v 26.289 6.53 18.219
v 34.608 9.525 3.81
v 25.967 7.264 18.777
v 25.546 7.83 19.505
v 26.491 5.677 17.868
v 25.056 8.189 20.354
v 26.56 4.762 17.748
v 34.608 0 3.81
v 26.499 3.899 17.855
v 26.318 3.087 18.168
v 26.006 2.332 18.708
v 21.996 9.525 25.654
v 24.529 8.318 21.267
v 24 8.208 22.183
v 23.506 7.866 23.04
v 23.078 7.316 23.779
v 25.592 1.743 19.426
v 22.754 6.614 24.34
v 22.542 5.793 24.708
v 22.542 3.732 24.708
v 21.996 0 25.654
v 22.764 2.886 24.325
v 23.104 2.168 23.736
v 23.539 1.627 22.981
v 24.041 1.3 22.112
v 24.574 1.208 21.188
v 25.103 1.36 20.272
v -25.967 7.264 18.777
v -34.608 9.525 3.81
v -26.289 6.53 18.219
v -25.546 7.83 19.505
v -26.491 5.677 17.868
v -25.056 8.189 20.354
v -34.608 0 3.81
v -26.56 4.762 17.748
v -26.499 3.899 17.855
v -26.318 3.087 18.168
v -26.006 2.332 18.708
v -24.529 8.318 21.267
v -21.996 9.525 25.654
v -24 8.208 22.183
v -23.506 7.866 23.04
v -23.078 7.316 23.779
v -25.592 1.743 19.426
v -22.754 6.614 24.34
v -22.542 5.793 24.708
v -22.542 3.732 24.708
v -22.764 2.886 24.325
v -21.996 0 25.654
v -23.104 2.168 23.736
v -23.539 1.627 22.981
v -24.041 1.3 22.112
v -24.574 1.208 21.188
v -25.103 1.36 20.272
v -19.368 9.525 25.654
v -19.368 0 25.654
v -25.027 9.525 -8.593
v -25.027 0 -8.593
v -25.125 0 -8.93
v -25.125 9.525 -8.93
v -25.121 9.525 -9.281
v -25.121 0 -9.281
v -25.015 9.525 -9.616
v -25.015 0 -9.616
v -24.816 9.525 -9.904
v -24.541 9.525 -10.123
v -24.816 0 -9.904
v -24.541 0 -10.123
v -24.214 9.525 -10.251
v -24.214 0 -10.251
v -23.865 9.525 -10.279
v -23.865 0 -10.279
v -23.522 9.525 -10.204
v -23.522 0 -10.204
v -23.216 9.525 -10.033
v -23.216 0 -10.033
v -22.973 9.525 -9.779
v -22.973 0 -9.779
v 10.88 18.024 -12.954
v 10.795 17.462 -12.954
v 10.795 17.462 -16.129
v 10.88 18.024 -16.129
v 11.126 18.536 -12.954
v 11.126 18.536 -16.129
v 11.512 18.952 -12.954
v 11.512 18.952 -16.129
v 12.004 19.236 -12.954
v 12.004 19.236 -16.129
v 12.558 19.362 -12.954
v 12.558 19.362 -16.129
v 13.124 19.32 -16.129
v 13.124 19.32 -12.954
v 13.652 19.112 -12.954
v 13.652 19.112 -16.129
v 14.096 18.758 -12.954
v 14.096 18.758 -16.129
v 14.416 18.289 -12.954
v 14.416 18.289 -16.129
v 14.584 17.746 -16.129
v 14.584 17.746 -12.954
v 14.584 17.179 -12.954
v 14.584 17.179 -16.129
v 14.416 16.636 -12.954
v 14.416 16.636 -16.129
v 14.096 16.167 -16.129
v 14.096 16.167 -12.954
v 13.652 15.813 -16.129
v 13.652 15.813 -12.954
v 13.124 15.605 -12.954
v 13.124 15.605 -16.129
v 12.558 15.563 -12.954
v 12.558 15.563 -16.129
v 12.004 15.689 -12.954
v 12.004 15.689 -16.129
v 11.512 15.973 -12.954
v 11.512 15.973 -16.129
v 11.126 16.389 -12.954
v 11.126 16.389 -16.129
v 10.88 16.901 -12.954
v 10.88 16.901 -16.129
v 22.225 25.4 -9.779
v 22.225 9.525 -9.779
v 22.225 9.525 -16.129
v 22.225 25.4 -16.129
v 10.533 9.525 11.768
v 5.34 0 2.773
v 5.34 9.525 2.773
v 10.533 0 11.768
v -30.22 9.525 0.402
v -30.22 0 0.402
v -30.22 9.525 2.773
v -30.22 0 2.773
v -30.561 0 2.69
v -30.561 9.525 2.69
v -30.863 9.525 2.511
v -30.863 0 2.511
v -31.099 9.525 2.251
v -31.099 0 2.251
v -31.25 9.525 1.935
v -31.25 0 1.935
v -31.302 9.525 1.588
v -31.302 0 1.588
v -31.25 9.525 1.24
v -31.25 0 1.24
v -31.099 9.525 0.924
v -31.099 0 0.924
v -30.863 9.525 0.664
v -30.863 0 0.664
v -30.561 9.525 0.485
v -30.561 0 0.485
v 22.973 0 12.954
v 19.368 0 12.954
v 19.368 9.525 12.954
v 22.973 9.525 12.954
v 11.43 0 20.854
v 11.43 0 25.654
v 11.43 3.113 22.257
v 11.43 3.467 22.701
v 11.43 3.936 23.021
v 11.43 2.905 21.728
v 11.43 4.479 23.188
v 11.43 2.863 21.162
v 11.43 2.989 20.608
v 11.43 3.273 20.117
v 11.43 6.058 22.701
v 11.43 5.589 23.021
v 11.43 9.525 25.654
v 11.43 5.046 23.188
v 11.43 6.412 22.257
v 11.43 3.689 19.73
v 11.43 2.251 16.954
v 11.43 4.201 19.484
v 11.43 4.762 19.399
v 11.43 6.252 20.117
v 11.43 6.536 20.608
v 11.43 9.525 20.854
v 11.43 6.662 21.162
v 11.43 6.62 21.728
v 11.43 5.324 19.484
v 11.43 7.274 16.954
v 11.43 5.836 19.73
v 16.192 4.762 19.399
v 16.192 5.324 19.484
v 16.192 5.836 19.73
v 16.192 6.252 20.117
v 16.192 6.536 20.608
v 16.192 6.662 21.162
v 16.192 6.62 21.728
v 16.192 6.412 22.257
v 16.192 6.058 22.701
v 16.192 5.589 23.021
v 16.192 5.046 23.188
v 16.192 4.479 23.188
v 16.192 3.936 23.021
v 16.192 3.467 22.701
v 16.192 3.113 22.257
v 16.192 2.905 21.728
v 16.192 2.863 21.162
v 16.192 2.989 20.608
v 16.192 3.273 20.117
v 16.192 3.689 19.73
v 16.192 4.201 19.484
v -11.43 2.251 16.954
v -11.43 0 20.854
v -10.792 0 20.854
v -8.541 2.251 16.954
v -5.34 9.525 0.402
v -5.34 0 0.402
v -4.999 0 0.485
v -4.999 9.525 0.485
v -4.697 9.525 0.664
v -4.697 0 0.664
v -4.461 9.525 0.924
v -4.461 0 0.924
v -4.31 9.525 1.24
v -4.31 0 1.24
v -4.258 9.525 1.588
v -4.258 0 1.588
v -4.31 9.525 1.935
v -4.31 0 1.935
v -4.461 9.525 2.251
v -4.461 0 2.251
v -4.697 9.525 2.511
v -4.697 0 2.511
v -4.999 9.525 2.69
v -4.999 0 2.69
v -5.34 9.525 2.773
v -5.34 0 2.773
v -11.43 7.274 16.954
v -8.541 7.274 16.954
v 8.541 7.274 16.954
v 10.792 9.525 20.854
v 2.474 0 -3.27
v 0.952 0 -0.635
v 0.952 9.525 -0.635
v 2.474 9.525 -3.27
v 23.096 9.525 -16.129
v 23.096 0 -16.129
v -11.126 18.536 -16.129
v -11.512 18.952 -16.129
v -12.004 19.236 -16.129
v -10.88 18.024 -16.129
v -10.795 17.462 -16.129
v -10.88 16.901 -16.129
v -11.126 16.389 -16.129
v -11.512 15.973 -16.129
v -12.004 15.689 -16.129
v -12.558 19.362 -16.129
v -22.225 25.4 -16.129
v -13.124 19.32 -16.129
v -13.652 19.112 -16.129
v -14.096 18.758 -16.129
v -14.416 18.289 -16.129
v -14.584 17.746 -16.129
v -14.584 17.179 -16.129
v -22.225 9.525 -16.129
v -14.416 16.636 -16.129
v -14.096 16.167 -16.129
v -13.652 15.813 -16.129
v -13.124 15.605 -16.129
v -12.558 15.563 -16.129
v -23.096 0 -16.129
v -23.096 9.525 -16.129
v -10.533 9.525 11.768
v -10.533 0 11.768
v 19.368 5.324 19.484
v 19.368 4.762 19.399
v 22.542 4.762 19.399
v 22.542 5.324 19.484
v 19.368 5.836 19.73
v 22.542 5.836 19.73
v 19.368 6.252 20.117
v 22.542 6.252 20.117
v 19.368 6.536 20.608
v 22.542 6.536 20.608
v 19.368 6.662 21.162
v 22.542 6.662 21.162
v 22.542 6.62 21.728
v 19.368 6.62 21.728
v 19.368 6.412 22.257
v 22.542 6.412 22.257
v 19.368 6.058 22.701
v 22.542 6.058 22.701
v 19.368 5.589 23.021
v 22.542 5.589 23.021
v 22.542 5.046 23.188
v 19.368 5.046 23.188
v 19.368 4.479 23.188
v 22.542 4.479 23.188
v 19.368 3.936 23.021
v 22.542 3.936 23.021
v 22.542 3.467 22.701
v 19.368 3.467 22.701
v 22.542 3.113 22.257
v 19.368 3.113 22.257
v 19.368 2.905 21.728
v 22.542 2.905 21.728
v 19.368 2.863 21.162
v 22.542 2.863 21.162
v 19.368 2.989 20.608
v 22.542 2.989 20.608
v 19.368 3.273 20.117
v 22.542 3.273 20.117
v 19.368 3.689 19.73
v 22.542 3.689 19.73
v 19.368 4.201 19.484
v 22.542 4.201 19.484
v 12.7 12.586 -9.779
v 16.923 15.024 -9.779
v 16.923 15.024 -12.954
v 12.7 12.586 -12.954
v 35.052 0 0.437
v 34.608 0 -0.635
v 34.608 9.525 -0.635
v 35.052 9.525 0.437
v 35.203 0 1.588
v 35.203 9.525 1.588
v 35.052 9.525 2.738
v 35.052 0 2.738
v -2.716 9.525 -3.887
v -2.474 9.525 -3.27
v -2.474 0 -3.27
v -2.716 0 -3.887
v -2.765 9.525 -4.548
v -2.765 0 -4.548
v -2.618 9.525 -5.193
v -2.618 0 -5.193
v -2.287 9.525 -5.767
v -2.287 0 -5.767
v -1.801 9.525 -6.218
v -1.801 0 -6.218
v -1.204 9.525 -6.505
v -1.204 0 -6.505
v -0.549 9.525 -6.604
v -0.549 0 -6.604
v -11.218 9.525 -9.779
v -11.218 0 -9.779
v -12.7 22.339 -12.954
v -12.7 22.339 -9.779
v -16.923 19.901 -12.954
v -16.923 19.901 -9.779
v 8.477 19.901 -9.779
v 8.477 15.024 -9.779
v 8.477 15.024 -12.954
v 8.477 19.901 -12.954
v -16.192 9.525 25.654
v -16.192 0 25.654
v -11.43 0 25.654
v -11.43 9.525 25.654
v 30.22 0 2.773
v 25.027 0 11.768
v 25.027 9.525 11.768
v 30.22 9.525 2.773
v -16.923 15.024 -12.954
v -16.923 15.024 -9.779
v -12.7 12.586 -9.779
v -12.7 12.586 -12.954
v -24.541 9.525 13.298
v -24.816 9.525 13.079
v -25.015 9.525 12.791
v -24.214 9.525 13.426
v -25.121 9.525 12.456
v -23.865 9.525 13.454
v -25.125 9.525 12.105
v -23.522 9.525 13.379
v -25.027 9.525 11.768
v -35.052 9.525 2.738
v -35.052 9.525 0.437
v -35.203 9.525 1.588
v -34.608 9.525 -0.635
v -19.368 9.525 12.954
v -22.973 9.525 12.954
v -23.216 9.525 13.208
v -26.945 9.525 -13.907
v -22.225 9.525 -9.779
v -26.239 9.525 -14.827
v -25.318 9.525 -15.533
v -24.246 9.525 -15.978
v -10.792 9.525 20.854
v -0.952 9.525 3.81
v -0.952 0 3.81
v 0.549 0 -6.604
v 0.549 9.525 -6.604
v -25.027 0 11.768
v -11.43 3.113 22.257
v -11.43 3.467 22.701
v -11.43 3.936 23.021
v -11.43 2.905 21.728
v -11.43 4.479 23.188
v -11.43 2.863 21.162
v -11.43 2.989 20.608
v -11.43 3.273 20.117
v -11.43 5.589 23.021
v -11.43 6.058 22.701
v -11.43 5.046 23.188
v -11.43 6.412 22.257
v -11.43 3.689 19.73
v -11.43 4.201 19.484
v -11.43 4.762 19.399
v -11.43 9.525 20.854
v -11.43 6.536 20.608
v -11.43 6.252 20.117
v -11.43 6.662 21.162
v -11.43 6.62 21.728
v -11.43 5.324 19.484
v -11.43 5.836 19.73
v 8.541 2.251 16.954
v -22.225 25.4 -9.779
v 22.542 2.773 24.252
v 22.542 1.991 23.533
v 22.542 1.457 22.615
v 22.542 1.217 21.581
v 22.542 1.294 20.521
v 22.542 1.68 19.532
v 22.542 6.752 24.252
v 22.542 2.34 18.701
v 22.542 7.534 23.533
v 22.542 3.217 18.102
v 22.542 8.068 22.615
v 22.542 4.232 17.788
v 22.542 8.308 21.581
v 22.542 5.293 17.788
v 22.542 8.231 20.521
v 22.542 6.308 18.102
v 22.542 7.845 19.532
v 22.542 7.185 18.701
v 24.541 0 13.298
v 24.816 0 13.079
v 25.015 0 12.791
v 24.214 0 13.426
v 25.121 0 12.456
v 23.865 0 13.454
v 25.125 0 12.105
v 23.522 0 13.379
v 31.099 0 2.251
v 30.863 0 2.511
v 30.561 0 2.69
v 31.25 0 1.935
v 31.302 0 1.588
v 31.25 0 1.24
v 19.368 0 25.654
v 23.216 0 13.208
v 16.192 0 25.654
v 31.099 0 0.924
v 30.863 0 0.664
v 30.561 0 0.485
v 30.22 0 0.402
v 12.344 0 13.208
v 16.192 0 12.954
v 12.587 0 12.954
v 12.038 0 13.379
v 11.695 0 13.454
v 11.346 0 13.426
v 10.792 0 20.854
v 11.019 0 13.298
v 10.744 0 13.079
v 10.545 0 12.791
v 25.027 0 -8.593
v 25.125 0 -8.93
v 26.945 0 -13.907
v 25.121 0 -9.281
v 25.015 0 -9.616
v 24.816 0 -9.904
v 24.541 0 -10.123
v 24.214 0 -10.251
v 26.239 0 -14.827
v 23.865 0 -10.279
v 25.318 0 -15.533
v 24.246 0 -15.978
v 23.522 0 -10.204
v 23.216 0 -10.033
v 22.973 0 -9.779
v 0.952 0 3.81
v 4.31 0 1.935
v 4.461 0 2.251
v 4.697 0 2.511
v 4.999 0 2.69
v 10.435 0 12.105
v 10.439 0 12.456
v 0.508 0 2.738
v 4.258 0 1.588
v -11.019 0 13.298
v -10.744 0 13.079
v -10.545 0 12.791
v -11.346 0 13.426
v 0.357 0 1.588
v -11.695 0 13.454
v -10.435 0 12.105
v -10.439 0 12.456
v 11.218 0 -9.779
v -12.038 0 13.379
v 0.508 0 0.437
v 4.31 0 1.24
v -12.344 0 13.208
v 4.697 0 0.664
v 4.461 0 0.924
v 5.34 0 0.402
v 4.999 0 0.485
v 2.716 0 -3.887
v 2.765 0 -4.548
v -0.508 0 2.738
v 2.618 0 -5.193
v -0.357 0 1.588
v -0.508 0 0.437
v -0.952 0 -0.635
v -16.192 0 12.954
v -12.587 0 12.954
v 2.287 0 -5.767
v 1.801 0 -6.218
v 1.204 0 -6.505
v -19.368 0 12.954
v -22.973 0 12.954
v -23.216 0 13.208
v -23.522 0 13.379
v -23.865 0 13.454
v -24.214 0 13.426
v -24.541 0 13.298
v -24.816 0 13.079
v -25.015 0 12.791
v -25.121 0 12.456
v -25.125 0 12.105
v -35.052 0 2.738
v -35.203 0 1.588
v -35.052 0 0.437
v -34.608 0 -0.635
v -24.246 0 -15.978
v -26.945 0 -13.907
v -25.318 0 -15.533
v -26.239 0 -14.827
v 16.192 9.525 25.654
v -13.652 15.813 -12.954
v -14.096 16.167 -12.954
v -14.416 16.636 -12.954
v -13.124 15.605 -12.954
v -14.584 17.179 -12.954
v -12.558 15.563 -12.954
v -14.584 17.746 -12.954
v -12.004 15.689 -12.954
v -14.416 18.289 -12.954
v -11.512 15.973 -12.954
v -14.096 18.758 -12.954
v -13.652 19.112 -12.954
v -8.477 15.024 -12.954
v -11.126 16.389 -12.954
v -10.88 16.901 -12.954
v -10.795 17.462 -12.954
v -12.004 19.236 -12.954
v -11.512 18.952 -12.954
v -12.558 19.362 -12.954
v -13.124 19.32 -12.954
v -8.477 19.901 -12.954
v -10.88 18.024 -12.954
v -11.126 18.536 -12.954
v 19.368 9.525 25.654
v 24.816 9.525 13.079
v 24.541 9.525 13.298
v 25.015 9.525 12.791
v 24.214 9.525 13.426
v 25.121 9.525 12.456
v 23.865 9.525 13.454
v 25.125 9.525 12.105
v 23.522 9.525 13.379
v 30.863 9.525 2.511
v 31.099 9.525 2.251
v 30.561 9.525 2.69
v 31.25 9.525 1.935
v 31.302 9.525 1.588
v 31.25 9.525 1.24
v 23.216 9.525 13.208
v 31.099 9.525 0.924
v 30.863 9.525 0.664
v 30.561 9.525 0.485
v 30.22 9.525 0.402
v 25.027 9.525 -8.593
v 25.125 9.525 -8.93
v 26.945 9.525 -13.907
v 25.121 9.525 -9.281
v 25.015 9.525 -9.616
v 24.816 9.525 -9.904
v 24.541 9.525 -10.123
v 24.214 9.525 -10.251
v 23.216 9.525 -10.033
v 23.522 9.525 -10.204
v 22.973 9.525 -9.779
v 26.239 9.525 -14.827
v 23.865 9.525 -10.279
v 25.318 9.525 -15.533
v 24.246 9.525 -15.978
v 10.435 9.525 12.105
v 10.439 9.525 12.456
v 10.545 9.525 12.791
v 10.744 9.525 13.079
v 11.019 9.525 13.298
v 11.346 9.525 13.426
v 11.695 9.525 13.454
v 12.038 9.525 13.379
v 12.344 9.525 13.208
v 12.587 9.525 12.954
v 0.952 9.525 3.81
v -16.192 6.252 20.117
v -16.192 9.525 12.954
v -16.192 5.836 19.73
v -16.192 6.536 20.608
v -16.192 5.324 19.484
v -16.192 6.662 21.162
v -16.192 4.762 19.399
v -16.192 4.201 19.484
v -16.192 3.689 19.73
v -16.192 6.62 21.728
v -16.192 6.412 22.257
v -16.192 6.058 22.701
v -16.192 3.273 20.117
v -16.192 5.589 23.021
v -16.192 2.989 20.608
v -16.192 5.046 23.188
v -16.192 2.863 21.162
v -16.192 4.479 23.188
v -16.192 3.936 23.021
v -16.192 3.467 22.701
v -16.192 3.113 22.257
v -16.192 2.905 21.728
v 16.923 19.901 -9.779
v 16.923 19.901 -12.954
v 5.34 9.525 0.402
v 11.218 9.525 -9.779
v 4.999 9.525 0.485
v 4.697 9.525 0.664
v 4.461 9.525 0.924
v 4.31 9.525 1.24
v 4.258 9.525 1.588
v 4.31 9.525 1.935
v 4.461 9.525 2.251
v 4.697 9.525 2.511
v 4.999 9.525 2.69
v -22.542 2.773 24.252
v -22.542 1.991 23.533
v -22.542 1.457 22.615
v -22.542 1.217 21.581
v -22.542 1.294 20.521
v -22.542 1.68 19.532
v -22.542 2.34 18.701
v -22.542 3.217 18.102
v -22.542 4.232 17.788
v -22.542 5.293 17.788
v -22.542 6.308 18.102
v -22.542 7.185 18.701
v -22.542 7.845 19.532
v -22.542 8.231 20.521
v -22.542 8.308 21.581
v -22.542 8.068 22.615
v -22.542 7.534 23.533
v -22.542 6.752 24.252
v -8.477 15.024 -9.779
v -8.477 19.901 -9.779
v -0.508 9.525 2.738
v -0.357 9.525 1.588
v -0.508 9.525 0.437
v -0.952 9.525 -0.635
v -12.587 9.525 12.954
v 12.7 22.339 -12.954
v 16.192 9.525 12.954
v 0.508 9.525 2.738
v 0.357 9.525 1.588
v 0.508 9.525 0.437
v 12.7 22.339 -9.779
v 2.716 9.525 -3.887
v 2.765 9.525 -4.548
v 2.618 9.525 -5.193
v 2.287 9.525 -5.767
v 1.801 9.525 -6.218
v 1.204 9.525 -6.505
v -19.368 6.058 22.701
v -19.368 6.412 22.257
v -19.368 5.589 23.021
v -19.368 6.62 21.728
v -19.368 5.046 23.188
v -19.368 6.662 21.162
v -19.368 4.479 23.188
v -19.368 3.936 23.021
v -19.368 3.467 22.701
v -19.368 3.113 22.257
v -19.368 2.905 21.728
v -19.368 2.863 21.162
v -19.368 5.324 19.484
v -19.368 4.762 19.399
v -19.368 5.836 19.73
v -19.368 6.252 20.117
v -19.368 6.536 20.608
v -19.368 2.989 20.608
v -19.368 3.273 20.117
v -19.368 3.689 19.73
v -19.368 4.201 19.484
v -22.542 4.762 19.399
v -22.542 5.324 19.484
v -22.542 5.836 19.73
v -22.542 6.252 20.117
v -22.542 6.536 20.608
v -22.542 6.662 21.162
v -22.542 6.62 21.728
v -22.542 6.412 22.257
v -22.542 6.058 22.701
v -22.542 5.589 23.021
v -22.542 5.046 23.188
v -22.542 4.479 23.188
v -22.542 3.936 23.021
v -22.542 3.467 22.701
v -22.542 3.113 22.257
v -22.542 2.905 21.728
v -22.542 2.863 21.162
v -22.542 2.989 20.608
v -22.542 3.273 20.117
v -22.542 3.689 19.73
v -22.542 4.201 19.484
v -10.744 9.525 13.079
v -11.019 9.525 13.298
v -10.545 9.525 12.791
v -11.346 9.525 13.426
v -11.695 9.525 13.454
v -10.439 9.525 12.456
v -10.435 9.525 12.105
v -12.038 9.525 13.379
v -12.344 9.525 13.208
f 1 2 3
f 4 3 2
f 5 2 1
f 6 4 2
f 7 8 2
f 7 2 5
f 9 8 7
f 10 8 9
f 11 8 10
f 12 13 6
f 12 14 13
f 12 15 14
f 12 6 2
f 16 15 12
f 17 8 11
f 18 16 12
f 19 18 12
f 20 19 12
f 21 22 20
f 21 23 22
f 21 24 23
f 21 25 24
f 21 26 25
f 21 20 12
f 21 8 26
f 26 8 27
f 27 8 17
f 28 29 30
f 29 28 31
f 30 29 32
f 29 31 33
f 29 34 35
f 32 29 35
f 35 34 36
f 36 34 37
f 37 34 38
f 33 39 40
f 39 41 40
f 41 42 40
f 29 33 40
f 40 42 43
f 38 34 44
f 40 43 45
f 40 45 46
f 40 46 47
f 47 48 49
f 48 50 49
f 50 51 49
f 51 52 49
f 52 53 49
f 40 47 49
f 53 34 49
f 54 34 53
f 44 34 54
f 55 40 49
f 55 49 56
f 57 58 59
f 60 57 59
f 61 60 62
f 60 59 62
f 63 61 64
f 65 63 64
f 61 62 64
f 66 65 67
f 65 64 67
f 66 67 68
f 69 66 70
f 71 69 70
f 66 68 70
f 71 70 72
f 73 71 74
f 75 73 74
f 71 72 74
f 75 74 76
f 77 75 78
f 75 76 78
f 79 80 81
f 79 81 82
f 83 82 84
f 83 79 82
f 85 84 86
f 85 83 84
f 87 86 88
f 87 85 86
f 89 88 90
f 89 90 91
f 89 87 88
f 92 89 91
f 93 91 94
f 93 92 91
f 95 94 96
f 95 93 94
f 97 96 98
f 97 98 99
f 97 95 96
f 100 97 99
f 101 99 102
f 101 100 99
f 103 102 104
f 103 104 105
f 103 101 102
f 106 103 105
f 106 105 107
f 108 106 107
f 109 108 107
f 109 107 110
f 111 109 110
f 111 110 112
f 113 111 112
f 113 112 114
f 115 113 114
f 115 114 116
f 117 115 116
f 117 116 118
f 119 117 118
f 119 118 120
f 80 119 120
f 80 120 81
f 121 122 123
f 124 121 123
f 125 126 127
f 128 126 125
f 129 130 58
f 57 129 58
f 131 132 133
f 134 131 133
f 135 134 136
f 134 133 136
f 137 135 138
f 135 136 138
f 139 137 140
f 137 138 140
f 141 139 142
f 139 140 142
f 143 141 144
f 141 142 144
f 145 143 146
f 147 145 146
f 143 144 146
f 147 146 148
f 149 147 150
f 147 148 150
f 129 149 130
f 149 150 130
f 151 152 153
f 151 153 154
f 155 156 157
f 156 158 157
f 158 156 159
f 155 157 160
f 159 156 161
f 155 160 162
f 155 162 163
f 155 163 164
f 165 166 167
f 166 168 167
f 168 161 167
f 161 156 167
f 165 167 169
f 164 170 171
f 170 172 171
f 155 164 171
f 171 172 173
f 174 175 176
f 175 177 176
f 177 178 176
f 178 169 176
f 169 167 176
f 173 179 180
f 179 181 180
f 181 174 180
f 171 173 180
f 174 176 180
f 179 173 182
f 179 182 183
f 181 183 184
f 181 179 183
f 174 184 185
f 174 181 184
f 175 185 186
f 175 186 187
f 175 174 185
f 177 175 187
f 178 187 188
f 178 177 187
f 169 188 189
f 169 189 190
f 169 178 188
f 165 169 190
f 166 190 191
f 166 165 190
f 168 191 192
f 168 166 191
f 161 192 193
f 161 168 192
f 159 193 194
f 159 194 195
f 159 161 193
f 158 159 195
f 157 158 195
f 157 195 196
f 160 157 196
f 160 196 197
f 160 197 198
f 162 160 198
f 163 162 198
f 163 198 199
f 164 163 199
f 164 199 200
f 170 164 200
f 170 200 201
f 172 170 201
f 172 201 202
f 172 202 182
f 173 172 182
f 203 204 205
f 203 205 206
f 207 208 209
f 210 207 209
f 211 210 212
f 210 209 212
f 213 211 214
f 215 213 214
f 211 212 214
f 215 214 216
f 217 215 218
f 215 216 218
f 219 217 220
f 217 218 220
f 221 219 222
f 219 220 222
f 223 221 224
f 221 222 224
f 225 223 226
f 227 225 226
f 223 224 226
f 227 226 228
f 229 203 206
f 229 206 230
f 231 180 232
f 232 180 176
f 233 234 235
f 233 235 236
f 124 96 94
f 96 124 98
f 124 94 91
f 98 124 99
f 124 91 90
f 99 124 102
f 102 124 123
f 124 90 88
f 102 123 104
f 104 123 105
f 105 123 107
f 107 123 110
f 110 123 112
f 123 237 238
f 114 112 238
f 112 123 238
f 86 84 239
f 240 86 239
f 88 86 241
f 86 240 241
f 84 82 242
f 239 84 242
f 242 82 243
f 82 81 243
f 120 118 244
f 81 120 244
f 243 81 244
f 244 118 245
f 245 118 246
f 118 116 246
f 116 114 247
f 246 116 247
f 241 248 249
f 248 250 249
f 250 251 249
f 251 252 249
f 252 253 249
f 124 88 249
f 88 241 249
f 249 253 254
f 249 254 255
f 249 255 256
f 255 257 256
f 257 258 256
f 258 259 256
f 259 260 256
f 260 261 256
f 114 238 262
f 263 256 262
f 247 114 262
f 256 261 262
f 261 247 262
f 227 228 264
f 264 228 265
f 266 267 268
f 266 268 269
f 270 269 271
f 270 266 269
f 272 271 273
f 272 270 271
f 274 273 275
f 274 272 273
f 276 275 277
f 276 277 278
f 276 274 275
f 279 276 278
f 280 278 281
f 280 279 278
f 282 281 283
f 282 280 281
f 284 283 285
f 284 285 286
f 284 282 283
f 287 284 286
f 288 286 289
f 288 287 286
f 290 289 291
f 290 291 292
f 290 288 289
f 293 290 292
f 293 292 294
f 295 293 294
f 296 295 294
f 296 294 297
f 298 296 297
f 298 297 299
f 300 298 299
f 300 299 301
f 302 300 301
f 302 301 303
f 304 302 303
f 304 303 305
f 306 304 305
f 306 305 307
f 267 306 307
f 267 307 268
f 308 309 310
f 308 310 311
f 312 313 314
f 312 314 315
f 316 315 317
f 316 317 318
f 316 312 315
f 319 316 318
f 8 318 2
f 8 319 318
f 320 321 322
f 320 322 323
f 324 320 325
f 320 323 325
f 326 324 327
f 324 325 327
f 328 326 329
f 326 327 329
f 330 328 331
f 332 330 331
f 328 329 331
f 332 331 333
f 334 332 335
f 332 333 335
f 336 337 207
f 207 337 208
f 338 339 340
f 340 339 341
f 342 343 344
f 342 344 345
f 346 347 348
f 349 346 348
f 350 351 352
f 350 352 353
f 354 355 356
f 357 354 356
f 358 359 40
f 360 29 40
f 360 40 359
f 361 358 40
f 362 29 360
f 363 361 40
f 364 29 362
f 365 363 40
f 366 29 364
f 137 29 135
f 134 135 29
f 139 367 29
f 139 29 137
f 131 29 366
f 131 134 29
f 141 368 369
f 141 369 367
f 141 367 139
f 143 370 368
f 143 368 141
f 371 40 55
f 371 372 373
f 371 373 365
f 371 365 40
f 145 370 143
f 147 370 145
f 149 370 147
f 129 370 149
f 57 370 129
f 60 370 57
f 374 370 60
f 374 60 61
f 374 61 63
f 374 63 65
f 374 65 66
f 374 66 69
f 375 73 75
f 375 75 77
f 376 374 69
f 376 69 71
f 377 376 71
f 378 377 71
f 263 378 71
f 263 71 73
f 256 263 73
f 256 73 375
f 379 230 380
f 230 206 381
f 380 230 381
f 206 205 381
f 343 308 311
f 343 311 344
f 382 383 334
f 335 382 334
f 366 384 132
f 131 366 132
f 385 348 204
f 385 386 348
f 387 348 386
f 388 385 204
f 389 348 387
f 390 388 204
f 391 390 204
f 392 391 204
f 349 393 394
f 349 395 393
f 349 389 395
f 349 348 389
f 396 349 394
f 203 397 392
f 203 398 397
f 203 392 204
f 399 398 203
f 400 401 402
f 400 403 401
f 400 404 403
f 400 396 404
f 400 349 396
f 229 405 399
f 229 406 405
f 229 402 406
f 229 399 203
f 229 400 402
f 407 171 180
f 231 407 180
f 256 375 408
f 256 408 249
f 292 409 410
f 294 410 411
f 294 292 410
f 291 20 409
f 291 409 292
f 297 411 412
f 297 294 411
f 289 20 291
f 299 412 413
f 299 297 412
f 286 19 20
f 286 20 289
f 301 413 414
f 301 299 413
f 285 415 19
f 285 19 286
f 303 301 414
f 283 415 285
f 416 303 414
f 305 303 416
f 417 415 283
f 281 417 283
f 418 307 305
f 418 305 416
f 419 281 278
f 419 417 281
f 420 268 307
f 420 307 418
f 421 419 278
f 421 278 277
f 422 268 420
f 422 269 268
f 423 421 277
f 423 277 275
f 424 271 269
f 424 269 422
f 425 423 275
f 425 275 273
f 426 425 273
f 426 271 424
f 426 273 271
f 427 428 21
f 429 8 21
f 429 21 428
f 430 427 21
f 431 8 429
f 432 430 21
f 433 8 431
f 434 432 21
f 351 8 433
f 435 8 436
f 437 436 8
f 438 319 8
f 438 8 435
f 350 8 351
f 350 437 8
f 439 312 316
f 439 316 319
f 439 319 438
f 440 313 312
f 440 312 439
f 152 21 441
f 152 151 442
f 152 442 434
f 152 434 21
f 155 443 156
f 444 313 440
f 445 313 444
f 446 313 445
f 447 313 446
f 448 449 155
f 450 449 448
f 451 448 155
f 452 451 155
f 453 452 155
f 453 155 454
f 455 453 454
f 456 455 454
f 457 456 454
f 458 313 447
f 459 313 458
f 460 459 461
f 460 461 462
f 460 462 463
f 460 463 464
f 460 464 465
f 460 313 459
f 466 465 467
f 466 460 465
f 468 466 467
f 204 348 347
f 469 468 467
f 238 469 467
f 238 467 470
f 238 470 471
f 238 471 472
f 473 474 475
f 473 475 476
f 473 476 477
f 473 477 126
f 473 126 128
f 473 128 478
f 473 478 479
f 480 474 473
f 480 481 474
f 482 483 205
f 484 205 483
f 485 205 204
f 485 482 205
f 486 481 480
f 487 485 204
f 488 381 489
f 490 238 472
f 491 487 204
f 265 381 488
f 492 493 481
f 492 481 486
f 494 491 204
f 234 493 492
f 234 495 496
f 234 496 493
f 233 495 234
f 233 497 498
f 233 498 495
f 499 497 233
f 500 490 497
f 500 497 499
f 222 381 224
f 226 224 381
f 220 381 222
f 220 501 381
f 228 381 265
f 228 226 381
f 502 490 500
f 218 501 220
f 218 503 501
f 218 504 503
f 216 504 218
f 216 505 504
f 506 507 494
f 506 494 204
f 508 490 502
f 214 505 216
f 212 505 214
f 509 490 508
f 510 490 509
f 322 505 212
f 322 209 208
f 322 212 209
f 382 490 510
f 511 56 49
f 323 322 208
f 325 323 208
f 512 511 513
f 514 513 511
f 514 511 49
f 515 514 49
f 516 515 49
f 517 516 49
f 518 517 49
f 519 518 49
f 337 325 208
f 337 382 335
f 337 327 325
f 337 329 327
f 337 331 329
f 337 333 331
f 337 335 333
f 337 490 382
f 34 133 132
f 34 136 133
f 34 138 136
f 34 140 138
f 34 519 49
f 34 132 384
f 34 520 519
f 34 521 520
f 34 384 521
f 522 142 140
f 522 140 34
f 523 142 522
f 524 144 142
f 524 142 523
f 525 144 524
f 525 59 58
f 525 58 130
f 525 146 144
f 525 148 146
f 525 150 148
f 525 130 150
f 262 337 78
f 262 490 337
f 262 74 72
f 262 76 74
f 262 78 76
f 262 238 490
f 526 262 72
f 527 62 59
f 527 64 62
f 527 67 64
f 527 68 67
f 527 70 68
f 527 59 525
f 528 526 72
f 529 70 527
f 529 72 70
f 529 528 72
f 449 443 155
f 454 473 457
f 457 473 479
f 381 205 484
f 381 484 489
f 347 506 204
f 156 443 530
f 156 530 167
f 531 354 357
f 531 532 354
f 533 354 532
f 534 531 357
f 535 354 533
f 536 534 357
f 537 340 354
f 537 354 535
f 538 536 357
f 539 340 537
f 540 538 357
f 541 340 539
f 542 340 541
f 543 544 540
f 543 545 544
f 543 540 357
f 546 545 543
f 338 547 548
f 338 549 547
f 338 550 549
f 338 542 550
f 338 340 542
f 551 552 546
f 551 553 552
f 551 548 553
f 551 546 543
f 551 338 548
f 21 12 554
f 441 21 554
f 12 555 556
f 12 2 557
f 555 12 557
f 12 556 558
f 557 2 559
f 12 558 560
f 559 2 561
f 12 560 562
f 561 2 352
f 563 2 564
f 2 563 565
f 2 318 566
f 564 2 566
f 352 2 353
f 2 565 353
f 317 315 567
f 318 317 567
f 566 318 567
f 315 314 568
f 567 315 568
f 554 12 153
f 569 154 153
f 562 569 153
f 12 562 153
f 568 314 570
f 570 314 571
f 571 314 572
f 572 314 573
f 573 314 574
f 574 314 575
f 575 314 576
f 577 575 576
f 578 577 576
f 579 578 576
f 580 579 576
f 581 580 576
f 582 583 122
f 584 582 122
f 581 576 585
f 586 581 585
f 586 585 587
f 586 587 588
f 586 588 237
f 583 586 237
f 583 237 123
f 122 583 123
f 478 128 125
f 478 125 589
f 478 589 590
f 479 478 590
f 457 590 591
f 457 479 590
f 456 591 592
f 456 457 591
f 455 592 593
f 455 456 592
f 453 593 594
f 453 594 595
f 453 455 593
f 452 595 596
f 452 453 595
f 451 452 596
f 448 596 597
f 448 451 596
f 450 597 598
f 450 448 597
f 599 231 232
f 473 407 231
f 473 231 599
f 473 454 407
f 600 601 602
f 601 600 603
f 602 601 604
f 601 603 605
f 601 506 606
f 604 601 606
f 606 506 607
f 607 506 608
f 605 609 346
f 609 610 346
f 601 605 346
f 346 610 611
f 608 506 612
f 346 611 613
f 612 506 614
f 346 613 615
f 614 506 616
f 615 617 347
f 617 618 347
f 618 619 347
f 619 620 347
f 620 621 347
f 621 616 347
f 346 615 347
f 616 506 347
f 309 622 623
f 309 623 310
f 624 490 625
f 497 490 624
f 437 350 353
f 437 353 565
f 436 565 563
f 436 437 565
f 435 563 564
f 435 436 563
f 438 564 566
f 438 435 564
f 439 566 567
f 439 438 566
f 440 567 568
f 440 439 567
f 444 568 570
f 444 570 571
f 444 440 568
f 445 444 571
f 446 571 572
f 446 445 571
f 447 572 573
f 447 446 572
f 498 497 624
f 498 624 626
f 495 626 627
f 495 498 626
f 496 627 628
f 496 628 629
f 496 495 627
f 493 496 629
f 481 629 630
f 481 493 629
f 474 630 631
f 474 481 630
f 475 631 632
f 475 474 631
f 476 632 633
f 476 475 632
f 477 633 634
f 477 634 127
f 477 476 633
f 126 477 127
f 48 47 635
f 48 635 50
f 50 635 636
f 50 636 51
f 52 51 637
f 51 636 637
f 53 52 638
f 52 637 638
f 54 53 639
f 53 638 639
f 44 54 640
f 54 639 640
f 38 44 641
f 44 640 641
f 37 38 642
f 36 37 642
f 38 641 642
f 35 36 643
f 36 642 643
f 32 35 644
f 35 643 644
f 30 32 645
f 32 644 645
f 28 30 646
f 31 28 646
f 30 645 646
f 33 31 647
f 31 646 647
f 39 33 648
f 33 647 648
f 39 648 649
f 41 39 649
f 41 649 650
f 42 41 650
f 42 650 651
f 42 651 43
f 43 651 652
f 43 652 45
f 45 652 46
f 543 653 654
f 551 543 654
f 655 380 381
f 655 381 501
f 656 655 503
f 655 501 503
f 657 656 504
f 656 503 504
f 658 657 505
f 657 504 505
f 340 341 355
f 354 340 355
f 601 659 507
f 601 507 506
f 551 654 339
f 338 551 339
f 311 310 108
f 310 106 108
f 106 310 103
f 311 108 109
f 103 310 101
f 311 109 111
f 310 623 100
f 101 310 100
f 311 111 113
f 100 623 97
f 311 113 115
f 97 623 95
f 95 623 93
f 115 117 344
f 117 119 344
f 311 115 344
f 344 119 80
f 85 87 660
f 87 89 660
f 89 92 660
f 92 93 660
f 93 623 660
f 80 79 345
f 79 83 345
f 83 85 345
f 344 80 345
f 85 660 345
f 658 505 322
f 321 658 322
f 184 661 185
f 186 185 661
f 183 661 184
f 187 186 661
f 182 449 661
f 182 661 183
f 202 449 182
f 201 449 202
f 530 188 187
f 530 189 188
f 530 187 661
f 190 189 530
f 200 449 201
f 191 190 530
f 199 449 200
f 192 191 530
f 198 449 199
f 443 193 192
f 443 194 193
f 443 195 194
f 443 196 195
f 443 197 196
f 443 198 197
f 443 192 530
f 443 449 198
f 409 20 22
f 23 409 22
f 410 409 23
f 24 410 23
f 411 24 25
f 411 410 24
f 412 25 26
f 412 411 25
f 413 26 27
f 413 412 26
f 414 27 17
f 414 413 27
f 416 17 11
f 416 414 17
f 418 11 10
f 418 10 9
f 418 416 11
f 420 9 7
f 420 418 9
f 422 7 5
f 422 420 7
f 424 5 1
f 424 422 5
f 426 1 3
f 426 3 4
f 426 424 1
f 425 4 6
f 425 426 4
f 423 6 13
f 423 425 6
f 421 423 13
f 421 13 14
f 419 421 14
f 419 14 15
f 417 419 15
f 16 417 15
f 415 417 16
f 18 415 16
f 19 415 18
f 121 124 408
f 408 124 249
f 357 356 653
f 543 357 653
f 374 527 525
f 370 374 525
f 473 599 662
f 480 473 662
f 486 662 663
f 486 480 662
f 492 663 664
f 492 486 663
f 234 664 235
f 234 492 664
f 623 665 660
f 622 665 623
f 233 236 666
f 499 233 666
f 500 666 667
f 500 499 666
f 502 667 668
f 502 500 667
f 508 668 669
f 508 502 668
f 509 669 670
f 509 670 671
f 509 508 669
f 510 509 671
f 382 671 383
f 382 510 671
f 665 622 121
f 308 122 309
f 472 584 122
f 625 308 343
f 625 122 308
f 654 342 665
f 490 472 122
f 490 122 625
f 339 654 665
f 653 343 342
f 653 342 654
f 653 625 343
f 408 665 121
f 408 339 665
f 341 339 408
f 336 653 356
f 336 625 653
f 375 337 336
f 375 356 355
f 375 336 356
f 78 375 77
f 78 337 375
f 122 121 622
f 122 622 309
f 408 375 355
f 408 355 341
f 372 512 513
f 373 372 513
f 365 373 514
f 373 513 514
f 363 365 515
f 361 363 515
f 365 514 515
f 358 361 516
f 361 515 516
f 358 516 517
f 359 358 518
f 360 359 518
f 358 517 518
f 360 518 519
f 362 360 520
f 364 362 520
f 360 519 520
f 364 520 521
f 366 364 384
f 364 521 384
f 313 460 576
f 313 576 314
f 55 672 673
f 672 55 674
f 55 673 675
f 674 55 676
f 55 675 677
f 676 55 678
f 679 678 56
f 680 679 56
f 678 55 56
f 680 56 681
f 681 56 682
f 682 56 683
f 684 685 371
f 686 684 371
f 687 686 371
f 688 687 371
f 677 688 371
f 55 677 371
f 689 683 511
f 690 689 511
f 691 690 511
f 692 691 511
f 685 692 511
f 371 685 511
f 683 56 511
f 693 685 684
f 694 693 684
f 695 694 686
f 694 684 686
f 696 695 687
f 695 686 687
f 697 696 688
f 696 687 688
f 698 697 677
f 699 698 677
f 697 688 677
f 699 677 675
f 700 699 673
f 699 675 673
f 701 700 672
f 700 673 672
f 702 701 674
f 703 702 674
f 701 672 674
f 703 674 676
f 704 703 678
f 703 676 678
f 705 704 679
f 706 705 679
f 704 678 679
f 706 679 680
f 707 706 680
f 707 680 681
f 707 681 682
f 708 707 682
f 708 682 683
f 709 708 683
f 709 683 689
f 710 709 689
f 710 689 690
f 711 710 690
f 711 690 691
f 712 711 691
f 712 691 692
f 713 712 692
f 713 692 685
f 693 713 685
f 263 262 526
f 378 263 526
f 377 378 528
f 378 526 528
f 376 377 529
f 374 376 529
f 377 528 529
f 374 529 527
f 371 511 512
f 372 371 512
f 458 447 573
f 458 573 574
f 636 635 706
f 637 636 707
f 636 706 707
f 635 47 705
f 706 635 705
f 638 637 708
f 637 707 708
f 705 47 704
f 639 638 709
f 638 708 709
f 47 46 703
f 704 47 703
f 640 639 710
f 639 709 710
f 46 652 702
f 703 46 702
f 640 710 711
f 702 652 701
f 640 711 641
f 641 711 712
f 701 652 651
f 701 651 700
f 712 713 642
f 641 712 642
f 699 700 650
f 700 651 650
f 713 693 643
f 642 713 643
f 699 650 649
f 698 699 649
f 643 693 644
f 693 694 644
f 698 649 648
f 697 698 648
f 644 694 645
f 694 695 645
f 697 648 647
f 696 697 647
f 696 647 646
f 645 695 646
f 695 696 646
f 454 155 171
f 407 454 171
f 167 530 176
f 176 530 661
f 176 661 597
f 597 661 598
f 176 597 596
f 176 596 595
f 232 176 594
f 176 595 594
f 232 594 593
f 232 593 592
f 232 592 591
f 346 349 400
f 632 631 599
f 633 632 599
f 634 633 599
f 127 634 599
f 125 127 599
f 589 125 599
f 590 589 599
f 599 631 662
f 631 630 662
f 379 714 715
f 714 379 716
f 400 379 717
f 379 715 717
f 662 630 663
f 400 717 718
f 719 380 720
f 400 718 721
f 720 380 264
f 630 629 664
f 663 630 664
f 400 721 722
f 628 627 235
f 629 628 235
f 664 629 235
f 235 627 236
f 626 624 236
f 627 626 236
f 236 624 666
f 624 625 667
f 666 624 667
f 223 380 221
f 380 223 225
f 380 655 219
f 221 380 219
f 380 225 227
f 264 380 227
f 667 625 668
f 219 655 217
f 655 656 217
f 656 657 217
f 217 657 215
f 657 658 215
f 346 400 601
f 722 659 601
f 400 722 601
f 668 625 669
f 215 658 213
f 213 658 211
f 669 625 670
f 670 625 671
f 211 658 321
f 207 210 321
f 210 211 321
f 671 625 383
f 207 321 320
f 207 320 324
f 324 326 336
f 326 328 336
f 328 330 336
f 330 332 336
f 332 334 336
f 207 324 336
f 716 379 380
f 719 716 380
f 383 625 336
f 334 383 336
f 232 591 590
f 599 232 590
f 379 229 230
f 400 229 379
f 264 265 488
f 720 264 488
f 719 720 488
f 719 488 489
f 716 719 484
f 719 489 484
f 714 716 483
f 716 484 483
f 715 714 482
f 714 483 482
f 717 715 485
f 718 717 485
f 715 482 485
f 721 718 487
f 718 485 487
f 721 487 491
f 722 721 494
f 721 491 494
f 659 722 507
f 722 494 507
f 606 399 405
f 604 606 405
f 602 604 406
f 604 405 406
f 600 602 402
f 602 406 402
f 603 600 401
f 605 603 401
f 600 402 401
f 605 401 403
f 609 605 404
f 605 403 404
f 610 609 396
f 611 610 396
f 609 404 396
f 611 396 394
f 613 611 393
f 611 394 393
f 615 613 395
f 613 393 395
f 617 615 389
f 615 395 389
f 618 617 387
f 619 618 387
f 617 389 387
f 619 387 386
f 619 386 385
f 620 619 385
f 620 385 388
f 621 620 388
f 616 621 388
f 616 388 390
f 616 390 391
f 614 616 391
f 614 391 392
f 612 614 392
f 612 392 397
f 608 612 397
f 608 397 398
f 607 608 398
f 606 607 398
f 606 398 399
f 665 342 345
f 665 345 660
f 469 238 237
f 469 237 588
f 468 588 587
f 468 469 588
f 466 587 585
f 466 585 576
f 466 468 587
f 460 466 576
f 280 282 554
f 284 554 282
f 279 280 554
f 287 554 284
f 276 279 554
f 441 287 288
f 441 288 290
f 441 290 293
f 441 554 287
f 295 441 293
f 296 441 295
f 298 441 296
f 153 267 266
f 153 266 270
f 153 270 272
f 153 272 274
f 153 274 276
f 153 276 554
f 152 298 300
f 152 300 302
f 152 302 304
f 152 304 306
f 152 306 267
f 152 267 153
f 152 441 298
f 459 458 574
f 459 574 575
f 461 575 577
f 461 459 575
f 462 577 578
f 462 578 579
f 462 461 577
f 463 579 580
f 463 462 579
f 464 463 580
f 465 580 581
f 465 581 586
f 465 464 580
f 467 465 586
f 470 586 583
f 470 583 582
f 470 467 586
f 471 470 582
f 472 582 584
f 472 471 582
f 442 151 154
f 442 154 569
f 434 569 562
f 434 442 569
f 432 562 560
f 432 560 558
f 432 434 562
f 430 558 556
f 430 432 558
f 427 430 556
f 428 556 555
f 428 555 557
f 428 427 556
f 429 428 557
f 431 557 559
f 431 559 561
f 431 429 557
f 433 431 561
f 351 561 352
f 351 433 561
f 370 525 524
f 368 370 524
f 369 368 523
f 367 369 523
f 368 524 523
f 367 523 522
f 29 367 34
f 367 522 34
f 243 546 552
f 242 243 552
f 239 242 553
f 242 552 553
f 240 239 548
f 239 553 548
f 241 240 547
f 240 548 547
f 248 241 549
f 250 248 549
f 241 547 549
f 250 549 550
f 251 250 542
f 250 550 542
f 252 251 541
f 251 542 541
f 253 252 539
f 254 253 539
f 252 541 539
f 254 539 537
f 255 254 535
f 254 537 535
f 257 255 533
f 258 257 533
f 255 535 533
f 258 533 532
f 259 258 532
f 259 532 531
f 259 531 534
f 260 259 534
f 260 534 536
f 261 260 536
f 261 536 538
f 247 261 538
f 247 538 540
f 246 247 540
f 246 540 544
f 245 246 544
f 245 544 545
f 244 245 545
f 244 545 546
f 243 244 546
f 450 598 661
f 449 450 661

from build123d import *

# Parameters (mm, degrees)
BOSS_EXTRUDE1_DEPTH = 9.525
SKETCH2_W           = 22.225
SKETCH2_H           = 6.35
BOSS_EXTRUDE2_DEPTH = 15.875
CUT_EXTRUDE1_DEPTH  = 3.175
SKETCH4_R           = 1.905
CUT_EXTRUDE2_DEPTH  = 59.094809978
CUT_EXTRUDE4_DEPTH  = 44.225634179
SKETCH6_R           = 1.905
CUT_EXTRUDE5_DEPTH  = 44.225634179
SKETCH7_R           = 3.556
CUT_EXTRUDE6_DEPTH  = 43.561156261


with BuildPart() as part:
    # Sketch1 → Boss-Extrude1 (new body)
    with BuildSketch(Plane(origin=(0, 0, 0), x_dir=(1, 0, 0), z_dir=(0, 1, 0))):
        with BuildLine():
            Line((0, 16.129), (-23.095952604, 16.129))
            ThreePointArc((-23.095952604, 16.129), (-25.318452604, 15.53348292), (-26.945435523, 13.9065))
            Line((-26.945435523, 13.9065), (-34.607739621, 0.635))
            ThreePointArc((-34.607739621, 0.635), (-35.203256701, -1.5875), (-34.607739621, -3.81))
            Line((-34.607739621, -3.81), (-21.996100341, -25.654))
            Line((-21.996100341, -25.654), (-19.3675, -25.654))
            Line((-19.3675, -25.654), (-19.3675, -12.954))
            Line((-19.3675, -12.954), (-22.973435593, -12.954))
            ThreePointArc((-22.973435593, -12.954), (-24.540889335, -13.297703832), (-25.026959956, -11.768397157))
            Line((-25.026959956, -11.768397157), (-30.220395549, -2.773102843))
            ThreePointArc((-30.220395549, -2.773102843), (-31.301778669, -1.5875), (-30.220395549, -0.401897157))
            Line((-30.220395549, -0.401897157), (-25.026959956, 8.593397157))
            ThreePointArc((-25.026959956, 8.593397157), (-24.540889335, 10.122703832), (-22.973435593, 9.779))
            Line((-22.973435593, 9.779), (-11.217548165, 9.779))
            Line((-11.217548165, 9.779), (-5.339604451, -0.401897157))
            ThreePointArc((-5.339604451, -0.401897157), (-4.258221331, -1.5875), (-5.339604451, -2.773102843))
            Line((-5.339604451, -2.773102843), (-10.533040044, -11.768397157))
            ThreePointArc((-10.533040044, -11.768397157), (-11.019110665, -13.297703832), (-12.586564407, -12.954))
            Line((-12.586564407, -12.954), (-16.1925, -12.954))
            Line((-16.1925, -12.954), (-16.1925, -25.654))
            Line((-16.1925, -25.654), (-11.43, -25.654))
            Line((-11.43, -25.654), (-11.43, -21.957977372))
            Line((-11.43, -21.957977372), (-0.952260379, -3.81))
            ThreePointArc((-0.952260379, -3.81), (-0.356743299, -1.5875), (-0.952260379, 0.635))
            Line((-0.952260379, 0.635), (-2.473722676, 3.27025))
            ThreePointArc((-2.473722676, 3.27025), (-2.473722676, 5.49275), (-0.548981216, 6.604))
            Line((-0.548981216, 6.604), (0, 6.604))
            Line((0, 6.604), (0, 16.129))
        make_face()
    extrude(amount=BOSS_EXTRUDE1_DEPTH)

    # Sketch2 → Boss-Extrude2 (add)
    with BuildSketch(Plane(origin=(0, 9.525, 0), x_dir=(1, 0, 0), z_dir=(0, 1, 0))):
        with Locations((-11.1125, 12.954)):
            Rectangle(SKETCH2_W, SKETCH2_H)
    extrude(amount=BOSS_EXTRUDE2_DEPTH)

    # Sketch3 → Cut-Extrude1 (cut)
    with BuildSketch(Plane.XY.offset(-9.779)):
        Polygon((-8.47725, 15.024494151), (-8.47725, 19.900505849), (-12.7, 22.338511698), (-16.92275, 19.900505849), (-16.92275, 15.024494151), (-12.7, 12.586488302), align=None)
    extrude(amount=-CUT_EXTRUDE1_DEPTH, mode=Mode.SUBTRACT)

    # Sketch4 → Cut-Extrude2 (cut, through all)
    with BuildSketch(Plane.XY.offset(-12.954)):
        with Locations((-12.7, 17.4625)):
            Circle(SKETCH4_R)
    extrude(amount=-CUT_EXTRUDE2_DEPTH, mode=Mode.SUBTRACT)

    # Sketch5 → Cut-Extrude4 (cut, through all)
    with BuildSketch(Plane.ZY.offset(11.43)):
        Polygon((21.30425, 9.785158667), (28.06158587, 9.785158667), (28.06158587, -0.260158667), (21.30425, -0.260158667), (16.9545, 2.251170667), (16.9545, 7.273829333), align=None)
    extrude(amount=-CUT_EXTRUDE4_DEPTH, mode=Mode.SUBTRACT)

    # Sketch6 → Cut-Extrude5 (cut, through all)
    with BuildSketch(Plane(origin=(-11.43, 0, 0), x_dir=(0, 0, -1), z_dir=(1, 0, 0))):
        with Locations((-21.30425, 4.7625)):
            Circle(SKETCH6_R)
    extrude(amount=-CUT_EXTRUDE5_DEPTH, mode=Mode.SUBTRACT)

    # Sketch7 → Cut-Extrude6 (cut, through all)
    with BuildSketch(Plane(origin=(-22.5425, 0, 0), x_dir=(0, 0, -1), z_dir=(1, 0, 0))):
        with Locations((-21.30425, 4.7625)):
            Circle(SKETCH7_R)
    extrude(amount=-CUT_EXTRUDE6_DEPTH, mode=Mode.SUBTRACT)

    # Mirror1: part across plane


with BuildPart() as part_1:
    add(part.part)
    add(part.part.mirror(Plane(origin=(0, 9.525, 0), x_dir=(0, 0, 1), z_dir=(1, 0, 0))))


solid = part_1.part
